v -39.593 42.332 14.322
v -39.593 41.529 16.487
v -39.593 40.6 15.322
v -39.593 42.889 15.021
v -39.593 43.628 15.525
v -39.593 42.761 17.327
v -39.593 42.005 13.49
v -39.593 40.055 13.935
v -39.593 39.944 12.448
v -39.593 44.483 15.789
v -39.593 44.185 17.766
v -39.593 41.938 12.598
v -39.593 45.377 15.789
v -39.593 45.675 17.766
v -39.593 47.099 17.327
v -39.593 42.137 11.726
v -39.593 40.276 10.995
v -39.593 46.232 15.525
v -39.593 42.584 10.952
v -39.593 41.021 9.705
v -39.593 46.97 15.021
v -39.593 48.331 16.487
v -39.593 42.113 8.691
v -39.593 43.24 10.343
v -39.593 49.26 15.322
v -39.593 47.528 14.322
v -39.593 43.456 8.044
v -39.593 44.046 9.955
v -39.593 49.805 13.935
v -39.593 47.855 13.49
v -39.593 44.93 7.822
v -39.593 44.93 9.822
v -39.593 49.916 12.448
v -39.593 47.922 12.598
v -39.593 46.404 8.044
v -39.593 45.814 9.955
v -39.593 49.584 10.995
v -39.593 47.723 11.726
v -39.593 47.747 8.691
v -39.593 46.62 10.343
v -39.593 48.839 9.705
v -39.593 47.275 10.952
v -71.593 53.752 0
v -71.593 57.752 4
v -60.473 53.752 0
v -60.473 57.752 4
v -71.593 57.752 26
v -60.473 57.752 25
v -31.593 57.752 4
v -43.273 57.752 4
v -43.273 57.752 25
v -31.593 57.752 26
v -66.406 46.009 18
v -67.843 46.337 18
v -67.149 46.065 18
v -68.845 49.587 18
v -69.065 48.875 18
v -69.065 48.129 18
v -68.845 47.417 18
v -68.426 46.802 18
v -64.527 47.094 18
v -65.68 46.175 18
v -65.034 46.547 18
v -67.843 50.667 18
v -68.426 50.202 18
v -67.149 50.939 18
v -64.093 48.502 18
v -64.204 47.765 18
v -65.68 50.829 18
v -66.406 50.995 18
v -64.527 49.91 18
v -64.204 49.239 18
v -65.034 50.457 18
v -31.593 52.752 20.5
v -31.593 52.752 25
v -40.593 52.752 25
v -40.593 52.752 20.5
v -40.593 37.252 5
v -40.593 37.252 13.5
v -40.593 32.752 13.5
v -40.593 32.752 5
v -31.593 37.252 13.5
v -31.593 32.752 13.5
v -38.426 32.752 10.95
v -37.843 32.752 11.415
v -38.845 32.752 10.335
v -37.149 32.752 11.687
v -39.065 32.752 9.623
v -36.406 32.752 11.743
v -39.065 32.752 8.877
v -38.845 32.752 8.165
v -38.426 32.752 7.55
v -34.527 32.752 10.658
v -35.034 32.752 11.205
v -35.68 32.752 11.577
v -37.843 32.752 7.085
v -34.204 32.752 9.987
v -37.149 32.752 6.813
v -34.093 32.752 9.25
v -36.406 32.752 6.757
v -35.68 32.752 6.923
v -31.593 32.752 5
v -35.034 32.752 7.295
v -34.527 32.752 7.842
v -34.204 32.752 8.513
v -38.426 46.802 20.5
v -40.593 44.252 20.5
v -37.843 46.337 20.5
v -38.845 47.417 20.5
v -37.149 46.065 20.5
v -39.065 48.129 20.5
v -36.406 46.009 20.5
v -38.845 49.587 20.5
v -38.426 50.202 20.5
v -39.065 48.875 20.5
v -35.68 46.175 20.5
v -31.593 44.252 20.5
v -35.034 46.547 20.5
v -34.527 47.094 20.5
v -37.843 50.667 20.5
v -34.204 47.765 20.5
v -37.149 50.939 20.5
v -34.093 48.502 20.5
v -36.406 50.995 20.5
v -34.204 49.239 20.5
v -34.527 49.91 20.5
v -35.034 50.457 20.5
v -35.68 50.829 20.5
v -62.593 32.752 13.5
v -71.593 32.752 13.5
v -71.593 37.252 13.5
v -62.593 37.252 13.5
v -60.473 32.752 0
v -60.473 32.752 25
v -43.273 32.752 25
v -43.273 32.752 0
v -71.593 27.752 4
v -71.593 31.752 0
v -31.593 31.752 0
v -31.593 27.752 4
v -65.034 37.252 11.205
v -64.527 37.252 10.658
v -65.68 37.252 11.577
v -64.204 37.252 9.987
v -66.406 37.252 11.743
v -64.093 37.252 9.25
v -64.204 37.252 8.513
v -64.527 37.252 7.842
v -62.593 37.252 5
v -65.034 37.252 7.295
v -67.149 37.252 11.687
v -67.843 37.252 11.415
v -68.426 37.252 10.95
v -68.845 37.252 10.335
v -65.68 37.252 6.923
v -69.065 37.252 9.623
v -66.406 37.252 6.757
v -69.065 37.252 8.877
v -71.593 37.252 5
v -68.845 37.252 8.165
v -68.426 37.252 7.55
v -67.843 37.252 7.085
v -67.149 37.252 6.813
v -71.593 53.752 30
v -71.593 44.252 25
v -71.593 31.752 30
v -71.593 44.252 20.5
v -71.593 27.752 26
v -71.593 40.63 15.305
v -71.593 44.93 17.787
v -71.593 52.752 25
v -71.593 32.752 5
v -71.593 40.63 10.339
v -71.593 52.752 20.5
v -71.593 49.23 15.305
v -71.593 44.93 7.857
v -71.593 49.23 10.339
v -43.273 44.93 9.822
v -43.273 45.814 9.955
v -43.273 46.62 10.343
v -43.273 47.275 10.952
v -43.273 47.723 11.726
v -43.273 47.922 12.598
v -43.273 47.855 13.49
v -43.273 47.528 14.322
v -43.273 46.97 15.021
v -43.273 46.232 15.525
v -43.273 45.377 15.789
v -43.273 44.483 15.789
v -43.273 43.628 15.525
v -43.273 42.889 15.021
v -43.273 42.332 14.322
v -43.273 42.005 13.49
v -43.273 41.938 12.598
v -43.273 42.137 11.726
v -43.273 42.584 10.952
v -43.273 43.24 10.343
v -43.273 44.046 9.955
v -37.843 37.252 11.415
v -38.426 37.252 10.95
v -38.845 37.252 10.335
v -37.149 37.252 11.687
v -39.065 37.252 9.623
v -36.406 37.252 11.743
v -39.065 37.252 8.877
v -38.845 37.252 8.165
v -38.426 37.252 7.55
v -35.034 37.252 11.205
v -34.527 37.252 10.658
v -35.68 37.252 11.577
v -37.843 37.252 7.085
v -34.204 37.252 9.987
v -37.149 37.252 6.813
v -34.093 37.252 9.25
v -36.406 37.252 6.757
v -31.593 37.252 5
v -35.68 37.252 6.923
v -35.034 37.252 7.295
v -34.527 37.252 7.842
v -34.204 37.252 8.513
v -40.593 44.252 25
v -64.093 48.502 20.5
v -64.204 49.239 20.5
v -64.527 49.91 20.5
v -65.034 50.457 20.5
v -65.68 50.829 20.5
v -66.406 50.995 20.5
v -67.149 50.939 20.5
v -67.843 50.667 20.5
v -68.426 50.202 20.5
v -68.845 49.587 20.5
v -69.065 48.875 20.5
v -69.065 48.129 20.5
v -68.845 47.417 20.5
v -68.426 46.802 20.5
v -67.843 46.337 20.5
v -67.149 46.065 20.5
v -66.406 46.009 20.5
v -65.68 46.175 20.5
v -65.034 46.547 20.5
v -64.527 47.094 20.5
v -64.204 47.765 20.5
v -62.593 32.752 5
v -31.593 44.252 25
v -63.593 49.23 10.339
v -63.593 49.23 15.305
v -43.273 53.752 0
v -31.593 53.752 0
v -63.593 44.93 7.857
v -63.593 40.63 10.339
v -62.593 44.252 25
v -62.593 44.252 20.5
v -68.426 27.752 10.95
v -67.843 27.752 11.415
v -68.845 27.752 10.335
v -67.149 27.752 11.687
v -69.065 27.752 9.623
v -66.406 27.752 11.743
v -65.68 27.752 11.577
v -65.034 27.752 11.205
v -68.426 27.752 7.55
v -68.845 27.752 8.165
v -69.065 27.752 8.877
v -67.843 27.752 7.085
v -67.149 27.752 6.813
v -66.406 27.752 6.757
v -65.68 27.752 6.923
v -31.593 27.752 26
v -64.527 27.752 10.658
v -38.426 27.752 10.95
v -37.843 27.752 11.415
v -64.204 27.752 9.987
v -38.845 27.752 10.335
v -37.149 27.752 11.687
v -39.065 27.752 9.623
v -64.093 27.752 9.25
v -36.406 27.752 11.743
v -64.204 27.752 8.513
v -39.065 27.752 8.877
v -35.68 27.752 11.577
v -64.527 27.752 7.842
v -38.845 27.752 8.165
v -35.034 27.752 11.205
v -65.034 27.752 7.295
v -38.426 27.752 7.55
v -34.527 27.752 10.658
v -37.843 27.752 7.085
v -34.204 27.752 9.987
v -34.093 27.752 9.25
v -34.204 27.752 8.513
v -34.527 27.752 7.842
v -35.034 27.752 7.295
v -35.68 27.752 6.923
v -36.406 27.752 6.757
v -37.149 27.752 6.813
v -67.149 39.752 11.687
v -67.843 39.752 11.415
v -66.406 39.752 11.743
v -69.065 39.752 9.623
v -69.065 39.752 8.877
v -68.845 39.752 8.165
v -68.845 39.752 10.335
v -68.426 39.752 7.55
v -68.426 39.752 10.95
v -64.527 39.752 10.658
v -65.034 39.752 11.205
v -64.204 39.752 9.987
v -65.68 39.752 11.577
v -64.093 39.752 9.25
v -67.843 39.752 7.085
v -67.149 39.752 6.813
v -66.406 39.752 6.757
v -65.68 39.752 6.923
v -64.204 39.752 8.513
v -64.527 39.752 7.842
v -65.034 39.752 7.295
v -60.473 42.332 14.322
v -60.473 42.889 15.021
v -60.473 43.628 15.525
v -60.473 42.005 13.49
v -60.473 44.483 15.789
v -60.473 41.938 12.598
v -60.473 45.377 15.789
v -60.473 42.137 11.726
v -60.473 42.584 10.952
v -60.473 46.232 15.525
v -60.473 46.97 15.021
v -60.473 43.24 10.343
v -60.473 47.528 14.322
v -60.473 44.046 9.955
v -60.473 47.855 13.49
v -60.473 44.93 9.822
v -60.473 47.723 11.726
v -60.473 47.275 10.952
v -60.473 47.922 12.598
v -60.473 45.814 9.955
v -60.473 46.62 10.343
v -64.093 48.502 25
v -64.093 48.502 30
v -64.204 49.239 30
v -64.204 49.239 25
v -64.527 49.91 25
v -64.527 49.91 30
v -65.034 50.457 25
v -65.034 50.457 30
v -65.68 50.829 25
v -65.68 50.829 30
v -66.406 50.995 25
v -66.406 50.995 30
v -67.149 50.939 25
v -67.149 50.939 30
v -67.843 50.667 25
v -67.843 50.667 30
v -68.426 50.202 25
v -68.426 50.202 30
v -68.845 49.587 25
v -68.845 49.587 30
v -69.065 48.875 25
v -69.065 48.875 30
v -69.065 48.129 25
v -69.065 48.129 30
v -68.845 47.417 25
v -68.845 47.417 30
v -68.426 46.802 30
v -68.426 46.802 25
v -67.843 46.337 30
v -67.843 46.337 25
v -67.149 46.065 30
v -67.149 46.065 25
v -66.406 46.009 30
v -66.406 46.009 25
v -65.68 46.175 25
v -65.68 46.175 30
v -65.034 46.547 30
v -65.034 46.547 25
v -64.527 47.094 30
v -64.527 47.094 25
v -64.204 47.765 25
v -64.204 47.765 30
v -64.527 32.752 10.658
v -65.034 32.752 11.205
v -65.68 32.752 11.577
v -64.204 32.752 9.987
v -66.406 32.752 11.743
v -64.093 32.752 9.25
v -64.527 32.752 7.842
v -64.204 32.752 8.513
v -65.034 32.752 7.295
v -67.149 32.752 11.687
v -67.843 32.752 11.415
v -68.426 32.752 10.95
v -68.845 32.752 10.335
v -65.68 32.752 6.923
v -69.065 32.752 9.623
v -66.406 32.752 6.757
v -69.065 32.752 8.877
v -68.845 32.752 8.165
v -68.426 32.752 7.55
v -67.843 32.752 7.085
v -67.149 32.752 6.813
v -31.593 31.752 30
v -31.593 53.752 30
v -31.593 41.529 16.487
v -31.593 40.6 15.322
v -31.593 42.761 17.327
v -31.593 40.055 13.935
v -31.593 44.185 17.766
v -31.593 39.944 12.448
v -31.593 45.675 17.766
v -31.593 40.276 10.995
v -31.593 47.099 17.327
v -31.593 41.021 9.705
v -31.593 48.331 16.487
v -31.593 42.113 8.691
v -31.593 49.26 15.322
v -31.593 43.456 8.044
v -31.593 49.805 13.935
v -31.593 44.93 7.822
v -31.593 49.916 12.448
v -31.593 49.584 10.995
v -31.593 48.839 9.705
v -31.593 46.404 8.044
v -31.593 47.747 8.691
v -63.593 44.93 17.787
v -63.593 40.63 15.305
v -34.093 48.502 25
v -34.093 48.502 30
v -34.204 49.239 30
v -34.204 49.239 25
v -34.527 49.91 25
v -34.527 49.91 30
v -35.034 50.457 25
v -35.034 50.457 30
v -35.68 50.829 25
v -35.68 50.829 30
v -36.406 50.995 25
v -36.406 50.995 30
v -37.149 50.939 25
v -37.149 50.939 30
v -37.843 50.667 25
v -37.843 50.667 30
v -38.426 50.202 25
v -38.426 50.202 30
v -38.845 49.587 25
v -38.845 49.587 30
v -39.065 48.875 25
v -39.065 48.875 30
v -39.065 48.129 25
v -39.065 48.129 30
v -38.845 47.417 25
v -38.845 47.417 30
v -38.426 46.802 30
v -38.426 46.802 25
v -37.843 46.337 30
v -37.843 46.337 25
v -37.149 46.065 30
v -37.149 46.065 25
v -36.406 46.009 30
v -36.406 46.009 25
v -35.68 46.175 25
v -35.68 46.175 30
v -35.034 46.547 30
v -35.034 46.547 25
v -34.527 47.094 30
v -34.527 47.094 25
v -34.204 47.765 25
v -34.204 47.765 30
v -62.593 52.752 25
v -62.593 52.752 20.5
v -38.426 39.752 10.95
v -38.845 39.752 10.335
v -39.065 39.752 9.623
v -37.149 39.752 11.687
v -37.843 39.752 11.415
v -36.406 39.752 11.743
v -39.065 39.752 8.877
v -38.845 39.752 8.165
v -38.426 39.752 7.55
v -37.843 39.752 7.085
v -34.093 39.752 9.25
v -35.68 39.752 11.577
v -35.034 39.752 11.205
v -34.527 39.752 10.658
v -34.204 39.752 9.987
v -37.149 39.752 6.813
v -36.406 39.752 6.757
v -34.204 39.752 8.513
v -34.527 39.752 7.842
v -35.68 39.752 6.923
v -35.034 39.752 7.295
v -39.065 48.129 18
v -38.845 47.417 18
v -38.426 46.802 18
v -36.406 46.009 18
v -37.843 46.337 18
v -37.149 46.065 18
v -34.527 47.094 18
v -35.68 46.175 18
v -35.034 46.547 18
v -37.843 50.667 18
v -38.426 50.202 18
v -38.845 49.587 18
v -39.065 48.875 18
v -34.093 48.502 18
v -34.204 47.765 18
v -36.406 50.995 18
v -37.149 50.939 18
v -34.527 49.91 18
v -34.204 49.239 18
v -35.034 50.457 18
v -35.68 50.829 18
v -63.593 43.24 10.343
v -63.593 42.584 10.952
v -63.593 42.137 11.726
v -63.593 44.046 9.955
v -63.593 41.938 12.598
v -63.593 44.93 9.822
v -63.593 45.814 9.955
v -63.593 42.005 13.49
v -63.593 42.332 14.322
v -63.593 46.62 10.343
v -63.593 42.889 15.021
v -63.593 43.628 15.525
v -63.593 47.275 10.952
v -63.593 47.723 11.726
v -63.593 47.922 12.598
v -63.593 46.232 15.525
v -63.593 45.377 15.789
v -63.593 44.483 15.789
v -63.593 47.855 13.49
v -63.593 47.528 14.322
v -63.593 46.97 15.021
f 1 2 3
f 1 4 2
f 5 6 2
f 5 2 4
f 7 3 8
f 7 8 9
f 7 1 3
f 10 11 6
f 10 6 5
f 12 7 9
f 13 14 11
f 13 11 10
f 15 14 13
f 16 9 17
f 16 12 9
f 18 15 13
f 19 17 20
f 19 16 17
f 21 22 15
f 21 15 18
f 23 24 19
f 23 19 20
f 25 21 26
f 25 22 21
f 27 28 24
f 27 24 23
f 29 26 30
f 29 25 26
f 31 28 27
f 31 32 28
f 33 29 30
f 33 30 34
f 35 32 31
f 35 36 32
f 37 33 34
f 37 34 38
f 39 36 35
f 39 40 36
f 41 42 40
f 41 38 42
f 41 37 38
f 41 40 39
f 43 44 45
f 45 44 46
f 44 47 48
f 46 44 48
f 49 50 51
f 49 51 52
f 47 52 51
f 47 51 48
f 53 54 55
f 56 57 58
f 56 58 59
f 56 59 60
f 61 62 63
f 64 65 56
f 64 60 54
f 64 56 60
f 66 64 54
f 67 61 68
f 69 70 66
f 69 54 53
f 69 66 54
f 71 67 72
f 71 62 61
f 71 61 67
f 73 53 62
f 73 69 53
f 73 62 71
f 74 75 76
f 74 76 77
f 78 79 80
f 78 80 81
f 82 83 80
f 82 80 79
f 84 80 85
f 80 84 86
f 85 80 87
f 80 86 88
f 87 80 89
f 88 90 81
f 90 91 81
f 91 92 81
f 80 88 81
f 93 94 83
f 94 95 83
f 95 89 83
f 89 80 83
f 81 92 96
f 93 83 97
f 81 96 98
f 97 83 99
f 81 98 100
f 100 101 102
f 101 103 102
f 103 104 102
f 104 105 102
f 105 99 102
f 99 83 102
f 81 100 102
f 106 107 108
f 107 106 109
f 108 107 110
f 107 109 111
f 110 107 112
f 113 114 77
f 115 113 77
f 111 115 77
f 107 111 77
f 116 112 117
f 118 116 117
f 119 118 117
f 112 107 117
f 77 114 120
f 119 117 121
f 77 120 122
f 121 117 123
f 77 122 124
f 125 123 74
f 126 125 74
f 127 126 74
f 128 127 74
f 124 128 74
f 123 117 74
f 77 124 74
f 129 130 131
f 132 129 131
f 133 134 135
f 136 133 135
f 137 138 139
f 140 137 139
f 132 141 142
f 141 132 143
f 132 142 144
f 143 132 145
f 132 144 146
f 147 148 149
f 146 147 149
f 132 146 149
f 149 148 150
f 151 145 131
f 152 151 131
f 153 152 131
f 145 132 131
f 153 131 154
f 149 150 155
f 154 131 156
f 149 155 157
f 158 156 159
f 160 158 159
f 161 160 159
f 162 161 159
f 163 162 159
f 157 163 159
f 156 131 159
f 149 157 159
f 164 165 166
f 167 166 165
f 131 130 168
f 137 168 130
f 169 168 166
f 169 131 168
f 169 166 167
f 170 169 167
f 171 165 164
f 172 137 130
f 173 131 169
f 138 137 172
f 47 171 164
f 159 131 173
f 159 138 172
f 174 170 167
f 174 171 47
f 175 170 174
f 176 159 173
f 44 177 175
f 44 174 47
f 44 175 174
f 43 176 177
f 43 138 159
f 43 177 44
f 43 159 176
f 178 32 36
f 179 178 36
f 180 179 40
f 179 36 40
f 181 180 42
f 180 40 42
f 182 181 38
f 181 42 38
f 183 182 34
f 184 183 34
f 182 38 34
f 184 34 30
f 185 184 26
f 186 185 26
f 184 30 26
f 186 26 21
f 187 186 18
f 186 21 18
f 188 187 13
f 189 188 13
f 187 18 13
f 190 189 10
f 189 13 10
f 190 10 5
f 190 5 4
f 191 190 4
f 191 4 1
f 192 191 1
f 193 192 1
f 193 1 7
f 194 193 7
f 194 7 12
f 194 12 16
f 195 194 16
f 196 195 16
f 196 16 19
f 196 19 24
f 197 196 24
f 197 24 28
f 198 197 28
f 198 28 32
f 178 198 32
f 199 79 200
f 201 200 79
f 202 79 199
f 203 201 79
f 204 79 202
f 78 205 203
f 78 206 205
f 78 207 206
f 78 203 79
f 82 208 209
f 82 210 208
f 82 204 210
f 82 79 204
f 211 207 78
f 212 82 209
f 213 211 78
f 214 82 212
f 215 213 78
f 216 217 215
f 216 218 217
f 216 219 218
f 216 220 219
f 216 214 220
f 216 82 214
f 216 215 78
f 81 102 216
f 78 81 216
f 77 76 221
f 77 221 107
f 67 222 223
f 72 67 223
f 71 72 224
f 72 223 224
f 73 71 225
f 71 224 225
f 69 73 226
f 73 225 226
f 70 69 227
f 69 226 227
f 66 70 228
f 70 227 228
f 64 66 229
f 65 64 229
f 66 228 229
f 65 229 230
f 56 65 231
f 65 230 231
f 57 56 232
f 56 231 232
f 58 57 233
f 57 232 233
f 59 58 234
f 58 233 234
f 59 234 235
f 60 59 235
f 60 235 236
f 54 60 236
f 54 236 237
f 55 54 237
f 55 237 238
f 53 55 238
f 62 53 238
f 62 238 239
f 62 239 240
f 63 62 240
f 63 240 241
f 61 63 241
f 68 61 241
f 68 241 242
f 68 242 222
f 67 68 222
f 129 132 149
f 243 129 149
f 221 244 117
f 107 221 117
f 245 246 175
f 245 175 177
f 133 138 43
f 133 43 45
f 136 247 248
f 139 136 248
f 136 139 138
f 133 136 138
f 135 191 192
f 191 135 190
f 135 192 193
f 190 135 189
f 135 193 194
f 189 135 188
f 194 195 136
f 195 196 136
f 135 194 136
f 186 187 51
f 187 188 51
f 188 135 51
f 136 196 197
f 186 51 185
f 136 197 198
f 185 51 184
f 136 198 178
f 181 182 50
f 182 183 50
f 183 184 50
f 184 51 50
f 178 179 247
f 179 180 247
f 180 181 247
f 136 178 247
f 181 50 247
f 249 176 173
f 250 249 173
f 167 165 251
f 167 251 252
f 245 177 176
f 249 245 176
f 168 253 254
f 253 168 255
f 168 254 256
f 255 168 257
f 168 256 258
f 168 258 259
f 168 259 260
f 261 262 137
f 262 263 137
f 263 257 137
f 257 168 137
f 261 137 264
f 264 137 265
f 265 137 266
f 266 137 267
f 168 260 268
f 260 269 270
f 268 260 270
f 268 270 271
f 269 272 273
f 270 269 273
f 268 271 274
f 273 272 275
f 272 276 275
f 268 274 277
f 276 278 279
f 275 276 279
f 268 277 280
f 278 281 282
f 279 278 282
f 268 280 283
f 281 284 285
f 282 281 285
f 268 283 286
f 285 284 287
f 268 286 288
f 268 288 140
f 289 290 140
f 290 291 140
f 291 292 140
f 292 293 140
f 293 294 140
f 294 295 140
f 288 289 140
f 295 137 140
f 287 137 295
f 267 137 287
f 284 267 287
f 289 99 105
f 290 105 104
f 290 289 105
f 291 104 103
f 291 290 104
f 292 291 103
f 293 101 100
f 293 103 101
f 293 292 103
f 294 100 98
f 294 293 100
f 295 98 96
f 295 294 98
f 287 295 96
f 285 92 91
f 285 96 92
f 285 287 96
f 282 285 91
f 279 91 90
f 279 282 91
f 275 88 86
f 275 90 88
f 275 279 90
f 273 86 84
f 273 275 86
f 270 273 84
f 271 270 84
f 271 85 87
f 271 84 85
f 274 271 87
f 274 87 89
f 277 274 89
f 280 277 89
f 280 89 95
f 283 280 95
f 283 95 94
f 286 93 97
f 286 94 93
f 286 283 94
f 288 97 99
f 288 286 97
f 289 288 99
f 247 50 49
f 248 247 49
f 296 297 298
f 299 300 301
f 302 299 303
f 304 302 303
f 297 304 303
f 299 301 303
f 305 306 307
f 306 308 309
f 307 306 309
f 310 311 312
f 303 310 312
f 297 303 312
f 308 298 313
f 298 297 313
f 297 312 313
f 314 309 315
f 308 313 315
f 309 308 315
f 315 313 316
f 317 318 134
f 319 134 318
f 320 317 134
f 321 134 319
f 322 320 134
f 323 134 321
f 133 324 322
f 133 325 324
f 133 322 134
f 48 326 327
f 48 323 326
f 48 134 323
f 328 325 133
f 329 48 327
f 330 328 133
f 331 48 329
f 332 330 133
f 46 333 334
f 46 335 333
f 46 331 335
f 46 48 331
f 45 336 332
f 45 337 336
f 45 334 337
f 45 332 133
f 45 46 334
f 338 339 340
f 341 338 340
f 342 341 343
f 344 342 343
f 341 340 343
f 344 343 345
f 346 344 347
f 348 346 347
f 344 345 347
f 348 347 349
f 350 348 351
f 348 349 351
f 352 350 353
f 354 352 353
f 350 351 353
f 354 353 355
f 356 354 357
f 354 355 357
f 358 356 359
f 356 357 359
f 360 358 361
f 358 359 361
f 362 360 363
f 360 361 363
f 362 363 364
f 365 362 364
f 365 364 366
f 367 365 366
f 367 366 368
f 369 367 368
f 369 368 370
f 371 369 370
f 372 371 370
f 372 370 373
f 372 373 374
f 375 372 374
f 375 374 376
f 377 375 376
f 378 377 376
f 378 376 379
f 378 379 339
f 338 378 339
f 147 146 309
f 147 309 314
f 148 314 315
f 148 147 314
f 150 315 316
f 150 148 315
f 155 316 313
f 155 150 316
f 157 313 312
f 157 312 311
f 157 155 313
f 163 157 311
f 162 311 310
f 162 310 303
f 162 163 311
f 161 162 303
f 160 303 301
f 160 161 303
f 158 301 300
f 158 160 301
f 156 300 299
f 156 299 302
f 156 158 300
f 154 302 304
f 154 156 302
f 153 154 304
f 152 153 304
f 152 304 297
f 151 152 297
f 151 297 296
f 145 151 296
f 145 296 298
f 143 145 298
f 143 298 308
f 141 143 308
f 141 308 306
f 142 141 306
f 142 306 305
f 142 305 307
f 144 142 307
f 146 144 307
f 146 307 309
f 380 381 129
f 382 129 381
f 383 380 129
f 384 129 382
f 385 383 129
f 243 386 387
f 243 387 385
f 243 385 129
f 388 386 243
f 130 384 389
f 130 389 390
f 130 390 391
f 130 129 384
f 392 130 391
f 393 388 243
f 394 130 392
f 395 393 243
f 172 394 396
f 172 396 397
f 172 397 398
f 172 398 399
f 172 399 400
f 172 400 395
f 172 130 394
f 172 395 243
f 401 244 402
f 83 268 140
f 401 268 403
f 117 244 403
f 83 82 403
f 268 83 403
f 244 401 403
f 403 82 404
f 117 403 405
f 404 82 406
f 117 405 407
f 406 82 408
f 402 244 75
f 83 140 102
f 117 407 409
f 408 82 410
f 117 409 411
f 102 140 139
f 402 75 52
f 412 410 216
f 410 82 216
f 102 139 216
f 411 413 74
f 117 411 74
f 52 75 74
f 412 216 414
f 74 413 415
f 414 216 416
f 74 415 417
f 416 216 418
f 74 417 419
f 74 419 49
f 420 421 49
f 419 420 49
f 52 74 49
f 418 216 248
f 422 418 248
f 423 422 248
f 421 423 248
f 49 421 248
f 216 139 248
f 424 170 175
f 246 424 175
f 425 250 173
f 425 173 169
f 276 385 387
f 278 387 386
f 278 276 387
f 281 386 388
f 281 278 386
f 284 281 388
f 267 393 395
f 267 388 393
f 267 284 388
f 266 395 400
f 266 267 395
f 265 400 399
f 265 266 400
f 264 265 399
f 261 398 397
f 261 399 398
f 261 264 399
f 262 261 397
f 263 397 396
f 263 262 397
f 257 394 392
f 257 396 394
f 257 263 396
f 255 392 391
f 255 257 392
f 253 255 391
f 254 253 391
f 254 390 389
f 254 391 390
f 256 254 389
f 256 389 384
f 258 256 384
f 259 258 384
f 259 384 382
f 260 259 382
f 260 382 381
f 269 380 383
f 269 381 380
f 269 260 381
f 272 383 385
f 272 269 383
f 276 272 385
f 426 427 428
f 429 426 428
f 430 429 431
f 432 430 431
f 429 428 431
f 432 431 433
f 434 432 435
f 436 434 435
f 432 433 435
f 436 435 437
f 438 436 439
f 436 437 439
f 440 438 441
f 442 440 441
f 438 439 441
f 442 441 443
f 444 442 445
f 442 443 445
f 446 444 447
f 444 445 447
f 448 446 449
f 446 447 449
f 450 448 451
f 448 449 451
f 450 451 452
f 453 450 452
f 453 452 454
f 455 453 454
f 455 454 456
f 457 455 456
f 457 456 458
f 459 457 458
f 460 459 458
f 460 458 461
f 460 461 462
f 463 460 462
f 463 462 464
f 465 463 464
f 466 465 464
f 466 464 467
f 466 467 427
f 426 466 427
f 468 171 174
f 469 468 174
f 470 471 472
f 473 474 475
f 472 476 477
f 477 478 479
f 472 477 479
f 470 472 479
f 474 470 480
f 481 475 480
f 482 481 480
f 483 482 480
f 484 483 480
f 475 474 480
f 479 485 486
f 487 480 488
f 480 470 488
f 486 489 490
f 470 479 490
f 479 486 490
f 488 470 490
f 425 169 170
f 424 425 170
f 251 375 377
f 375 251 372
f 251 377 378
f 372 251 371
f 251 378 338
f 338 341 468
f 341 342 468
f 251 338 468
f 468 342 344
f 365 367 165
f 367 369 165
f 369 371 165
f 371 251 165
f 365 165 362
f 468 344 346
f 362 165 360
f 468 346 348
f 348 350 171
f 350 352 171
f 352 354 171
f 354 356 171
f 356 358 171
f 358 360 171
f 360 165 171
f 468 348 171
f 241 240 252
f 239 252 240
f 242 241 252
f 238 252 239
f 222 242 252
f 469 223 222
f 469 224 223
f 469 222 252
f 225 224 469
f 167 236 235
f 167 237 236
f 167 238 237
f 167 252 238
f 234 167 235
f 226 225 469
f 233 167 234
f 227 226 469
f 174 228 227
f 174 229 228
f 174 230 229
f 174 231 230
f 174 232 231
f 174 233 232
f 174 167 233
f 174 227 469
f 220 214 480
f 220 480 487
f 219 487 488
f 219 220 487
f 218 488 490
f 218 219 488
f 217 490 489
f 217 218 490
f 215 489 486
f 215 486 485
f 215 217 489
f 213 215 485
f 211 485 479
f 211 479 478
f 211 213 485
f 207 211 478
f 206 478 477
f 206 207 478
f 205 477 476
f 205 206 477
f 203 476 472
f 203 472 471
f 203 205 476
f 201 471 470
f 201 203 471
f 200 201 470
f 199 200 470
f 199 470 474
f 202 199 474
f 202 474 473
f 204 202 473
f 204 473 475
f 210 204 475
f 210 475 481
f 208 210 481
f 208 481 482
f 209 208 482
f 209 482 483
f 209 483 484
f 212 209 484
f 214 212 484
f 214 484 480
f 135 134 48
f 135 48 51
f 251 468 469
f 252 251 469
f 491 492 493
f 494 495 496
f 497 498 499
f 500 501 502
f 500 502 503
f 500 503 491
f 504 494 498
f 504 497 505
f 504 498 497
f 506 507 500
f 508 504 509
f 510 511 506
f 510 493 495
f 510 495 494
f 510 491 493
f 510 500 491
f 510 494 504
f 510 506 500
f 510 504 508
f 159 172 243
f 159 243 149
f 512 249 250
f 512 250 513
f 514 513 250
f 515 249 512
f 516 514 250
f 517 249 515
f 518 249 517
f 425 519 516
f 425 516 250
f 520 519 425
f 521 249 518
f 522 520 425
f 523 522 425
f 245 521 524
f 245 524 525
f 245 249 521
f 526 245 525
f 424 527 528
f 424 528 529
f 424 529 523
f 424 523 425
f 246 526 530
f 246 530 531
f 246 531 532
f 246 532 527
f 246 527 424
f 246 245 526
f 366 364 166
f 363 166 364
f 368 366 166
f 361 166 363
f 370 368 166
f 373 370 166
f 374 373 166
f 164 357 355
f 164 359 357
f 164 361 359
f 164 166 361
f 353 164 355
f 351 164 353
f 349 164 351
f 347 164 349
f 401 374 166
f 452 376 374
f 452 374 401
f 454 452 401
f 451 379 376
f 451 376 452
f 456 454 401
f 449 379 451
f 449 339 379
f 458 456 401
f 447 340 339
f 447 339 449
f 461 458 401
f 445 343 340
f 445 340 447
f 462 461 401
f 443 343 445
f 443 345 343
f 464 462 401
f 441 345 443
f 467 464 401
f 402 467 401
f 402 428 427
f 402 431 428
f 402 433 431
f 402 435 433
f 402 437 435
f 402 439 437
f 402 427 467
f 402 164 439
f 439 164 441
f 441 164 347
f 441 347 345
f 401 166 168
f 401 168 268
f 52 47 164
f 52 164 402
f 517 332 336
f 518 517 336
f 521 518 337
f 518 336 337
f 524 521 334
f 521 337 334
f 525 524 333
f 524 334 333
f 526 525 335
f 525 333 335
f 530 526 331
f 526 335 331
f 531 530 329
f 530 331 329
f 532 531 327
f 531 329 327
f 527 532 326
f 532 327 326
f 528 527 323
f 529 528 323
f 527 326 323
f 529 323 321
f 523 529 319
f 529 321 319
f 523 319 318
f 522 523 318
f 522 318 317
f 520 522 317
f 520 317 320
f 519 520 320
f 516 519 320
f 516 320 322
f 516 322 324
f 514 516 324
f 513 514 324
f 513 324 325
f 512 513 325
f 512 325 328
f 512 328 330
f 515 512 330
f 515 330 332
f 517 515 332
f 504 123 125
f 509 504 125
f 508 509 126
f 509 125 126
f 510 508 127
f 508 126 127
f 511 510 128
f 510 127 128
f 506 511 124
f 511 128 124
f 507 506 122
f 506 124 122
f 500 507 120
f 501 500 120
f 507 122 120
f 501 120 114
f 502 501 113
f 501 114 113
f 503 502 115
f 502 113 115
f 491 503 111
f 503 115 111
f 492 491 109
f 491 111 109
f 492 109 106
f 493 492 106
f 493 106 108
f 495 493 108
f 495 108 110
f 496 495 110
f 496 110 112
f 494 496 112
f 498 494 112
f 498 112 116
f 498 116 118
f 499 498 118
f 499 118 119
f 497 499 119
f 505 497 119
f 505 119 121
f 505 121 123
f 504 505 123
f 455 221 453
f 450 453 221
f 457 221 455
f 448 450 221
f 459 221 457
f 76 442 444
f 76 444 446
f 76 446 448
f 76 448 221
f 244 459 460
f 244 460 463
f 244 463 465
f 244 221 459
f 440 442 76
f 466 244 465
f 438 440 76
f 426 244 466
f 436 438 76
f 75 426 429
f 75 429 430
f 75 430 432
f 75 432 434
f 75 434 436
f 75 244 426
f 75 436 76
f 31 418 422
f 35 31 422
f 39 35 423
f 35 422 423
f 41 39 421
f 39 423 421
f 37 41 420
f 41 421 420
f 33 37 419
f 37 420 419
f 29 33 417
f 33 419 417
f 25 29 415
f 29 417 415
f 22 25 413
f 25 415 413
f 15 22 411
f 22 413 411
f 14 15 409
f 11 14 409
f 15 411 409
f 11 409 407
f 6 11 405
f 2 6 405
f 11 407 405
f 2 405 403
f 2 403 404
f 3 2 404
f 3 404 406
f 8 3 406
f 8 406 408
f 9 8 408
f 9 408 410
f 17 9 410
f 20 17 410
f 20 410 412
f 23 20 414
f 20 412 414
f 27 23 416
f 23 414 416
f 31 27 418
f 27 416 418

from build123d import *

# Parameters (mm, degrees)
SKETCH1_W           = 39.999999999
SKETCH1_H           = 30
BOSS_EXTRUDE1_DEPTH = 30
SKETCH2_W           = 17.2
SKETCH2_H           = 33.728920846
CUT_EXTRUDE1_DEPTH  = 25
SKETCH3_R           = 3
CUT_EXTRUDE2_DEPTH  = 77.38910698
SKETCH4_W           = 8.5
SKETCH4_H           = 4.5
SKETCH4_W_2         = 4.5
SKETCH4_H_2         = 8.5
CUT_EXTRUDE3_DEPTH  = 9
CUT_EXTRUDE4_START  = -40
SKETCH4_2_W         = 8.5
SKETCH4_2_H         = 4.5
SKETCH4_2_W_2       = 4.5
SKETCH4_2_H_2       = 8.5
CUT_EXTRUDE4_DEPTH  = 9
SKETCH5_R           = 2.5
CUT_EXTRUDE5_DEPTH  = 12
CHAMFER1_SIZE       = 4
SKETCH6_R           = 5
CUT_EXTRUDE6_DEPTH  = 8
CUT_EXTRUDE7_DEPTH  = 8


with BuildPart() as part:
    # Sketch1 → Boss-Extrude1 (new body)
    with BuildSketch(Plane.XY):
        with Locations((-51.592932584, 42.752018711)):
            Rectangle(SKETCH1_W, SKETCH1_H)
    extrude(amount=BOSS_EXTRUDE1_DEPTH)

    # Sketch2 → Cut-Extrude1 (cut)
    with BuildSketch(Plane(origin=(0, 57.752018711, 0), x_dir=(1, 0, 0), z_dir=(0, 1, 0))):
        with Locations((-51.872932582, -8.135539577)):
            Rectangle(SKETCH2_W, SKETCH2_H)
    extrude(amount=-CUT_EXTRUDE1_DEPTH, mode=Mode.SUBTRACT)

    # Sketch3 → Cut-Extrude2 (cut, through all)
    with BuildSketch(Plane(origin=(-31.592932584, 0, 0), x_dir=(0, 0, -1), z_dir=(1, 0, 0))):
        with Locations((-12.822072937, 44.929945774)):
            Circle(SKETCH3_R)
    extrude(amount=-CUT_EXTRUDE2_DEPTH, mode=Mode.SUBTRACT)

    # Sketch4 → Cut-Extrude3 (cut)
    with BuildSketch(Plane(origin=(-31.592932584, 0, 0), x_dir=(0, 0, -1), z_dir=(1, 0, 0))):
        with Locations((-9.25, 35.002018711)):
            Rectangle(SKETCH4_W, SKETCH4_H)
        with Locations((-22.75, 48.502018711)):
            Rectangle(SKETCH4_W_2, SKETCH4_H_2)
    extrude(amount=-CUT_EXTRUDE3_DEPTH, mode=Mode.SUBTRACT)

    # Sketch4<2> → Cut-Extrude4 (cut)
    with BuildSketch(Plane(origin=(-31.592932584, 0, 0), x_dir=(0, 0, -1), z_dir=(1, 0, 0)).offset(CUT_EXTRUDE4_START)):
        with Locations((-9.25, 35.002018711)):
            Rectangle(SKETCH4_2_W, SKETCH4_2_H)
        with Locations((-22.75, 48.502018711)):
            Rectangle(SKETCH4_2_W_2, SKETCH4_2_H_2)
    extrude(amount=CUT_EXTRUDE4_DEPTH, mode=Mode.SUBTRACT)

    # Sketch5 → Cut-Extrude5 (cut)
    with BuildSketch(Plane.XY.offset(30)):
        with Locations((-66.592932583, 48.502018711)):
            Circle(SKETCH5_R)
        with Locations((-36.592932584, 48.502018711)):
            Circle(SKETCH5_R)
    cut_extrude5 = extrude(amount=-CUT_EXTRUDE5_DEPTH, mode=Mode.SUBTRACT)

    # Mirror1: Cut-Extrude5 across plane
    add(cut_extrude5.mirror(Plane(origin=(0, 28.876009355, 28.876009355), x_dir=(0, -0.7071067811865478, 0.7071067811865472), z_dir=(0, -0.7071067811865475, -0.7071067811865477))), mode=Mode.SUBTRACT)

    # Chamfer1
    chamfer1_edges = [part.edges().sort_by_distance(p)[0] for p in [
        (-51.592932584, 27.752018711, 30),
        (-66.032932583, 57.752018711, 0),
        (-51.592932584, 27.752018711, 0),
        (-37.432932583, 57.752018711, 0),
        (-51.592932584, 57.752018711, 30),
    ]]
    chamfer(chamfer1_edges, length=CHAMFER1_SIZE)

    # Sketch6 → Cut-Extrude6 (cut)
    with BuildSketch(Plane(origin=(-31.592932584, 0, 0), x_dir=(0, 0, -1), z_dir=(1, 0, 0))):
        with Locations((-12.822072937, 44.929945774)):
            Circle(SKETCH6_R)
    extrude(amount=-CUT_EXTRUDE6_DEPTH, mode=Mode.SUBTRACT)

    # Sketch7 → Cut-Extrude7 (cut)
    with BuildSketch(Plane.ZY.offset(71.592932583)):
        Polygon((15.304679094, 40.629945774), (17.787285252, 44.929945774), (15.304679094, 49.229945774), (10.339466779, 49.229945774), (7.856860622, 44.929945774), (10.339466779, 40.629945774), align=None)
    extrude(amount=-CUT_EXTRUDE7_DEPTH, mode=Mode.SUBTRACT)


solid = part.part
